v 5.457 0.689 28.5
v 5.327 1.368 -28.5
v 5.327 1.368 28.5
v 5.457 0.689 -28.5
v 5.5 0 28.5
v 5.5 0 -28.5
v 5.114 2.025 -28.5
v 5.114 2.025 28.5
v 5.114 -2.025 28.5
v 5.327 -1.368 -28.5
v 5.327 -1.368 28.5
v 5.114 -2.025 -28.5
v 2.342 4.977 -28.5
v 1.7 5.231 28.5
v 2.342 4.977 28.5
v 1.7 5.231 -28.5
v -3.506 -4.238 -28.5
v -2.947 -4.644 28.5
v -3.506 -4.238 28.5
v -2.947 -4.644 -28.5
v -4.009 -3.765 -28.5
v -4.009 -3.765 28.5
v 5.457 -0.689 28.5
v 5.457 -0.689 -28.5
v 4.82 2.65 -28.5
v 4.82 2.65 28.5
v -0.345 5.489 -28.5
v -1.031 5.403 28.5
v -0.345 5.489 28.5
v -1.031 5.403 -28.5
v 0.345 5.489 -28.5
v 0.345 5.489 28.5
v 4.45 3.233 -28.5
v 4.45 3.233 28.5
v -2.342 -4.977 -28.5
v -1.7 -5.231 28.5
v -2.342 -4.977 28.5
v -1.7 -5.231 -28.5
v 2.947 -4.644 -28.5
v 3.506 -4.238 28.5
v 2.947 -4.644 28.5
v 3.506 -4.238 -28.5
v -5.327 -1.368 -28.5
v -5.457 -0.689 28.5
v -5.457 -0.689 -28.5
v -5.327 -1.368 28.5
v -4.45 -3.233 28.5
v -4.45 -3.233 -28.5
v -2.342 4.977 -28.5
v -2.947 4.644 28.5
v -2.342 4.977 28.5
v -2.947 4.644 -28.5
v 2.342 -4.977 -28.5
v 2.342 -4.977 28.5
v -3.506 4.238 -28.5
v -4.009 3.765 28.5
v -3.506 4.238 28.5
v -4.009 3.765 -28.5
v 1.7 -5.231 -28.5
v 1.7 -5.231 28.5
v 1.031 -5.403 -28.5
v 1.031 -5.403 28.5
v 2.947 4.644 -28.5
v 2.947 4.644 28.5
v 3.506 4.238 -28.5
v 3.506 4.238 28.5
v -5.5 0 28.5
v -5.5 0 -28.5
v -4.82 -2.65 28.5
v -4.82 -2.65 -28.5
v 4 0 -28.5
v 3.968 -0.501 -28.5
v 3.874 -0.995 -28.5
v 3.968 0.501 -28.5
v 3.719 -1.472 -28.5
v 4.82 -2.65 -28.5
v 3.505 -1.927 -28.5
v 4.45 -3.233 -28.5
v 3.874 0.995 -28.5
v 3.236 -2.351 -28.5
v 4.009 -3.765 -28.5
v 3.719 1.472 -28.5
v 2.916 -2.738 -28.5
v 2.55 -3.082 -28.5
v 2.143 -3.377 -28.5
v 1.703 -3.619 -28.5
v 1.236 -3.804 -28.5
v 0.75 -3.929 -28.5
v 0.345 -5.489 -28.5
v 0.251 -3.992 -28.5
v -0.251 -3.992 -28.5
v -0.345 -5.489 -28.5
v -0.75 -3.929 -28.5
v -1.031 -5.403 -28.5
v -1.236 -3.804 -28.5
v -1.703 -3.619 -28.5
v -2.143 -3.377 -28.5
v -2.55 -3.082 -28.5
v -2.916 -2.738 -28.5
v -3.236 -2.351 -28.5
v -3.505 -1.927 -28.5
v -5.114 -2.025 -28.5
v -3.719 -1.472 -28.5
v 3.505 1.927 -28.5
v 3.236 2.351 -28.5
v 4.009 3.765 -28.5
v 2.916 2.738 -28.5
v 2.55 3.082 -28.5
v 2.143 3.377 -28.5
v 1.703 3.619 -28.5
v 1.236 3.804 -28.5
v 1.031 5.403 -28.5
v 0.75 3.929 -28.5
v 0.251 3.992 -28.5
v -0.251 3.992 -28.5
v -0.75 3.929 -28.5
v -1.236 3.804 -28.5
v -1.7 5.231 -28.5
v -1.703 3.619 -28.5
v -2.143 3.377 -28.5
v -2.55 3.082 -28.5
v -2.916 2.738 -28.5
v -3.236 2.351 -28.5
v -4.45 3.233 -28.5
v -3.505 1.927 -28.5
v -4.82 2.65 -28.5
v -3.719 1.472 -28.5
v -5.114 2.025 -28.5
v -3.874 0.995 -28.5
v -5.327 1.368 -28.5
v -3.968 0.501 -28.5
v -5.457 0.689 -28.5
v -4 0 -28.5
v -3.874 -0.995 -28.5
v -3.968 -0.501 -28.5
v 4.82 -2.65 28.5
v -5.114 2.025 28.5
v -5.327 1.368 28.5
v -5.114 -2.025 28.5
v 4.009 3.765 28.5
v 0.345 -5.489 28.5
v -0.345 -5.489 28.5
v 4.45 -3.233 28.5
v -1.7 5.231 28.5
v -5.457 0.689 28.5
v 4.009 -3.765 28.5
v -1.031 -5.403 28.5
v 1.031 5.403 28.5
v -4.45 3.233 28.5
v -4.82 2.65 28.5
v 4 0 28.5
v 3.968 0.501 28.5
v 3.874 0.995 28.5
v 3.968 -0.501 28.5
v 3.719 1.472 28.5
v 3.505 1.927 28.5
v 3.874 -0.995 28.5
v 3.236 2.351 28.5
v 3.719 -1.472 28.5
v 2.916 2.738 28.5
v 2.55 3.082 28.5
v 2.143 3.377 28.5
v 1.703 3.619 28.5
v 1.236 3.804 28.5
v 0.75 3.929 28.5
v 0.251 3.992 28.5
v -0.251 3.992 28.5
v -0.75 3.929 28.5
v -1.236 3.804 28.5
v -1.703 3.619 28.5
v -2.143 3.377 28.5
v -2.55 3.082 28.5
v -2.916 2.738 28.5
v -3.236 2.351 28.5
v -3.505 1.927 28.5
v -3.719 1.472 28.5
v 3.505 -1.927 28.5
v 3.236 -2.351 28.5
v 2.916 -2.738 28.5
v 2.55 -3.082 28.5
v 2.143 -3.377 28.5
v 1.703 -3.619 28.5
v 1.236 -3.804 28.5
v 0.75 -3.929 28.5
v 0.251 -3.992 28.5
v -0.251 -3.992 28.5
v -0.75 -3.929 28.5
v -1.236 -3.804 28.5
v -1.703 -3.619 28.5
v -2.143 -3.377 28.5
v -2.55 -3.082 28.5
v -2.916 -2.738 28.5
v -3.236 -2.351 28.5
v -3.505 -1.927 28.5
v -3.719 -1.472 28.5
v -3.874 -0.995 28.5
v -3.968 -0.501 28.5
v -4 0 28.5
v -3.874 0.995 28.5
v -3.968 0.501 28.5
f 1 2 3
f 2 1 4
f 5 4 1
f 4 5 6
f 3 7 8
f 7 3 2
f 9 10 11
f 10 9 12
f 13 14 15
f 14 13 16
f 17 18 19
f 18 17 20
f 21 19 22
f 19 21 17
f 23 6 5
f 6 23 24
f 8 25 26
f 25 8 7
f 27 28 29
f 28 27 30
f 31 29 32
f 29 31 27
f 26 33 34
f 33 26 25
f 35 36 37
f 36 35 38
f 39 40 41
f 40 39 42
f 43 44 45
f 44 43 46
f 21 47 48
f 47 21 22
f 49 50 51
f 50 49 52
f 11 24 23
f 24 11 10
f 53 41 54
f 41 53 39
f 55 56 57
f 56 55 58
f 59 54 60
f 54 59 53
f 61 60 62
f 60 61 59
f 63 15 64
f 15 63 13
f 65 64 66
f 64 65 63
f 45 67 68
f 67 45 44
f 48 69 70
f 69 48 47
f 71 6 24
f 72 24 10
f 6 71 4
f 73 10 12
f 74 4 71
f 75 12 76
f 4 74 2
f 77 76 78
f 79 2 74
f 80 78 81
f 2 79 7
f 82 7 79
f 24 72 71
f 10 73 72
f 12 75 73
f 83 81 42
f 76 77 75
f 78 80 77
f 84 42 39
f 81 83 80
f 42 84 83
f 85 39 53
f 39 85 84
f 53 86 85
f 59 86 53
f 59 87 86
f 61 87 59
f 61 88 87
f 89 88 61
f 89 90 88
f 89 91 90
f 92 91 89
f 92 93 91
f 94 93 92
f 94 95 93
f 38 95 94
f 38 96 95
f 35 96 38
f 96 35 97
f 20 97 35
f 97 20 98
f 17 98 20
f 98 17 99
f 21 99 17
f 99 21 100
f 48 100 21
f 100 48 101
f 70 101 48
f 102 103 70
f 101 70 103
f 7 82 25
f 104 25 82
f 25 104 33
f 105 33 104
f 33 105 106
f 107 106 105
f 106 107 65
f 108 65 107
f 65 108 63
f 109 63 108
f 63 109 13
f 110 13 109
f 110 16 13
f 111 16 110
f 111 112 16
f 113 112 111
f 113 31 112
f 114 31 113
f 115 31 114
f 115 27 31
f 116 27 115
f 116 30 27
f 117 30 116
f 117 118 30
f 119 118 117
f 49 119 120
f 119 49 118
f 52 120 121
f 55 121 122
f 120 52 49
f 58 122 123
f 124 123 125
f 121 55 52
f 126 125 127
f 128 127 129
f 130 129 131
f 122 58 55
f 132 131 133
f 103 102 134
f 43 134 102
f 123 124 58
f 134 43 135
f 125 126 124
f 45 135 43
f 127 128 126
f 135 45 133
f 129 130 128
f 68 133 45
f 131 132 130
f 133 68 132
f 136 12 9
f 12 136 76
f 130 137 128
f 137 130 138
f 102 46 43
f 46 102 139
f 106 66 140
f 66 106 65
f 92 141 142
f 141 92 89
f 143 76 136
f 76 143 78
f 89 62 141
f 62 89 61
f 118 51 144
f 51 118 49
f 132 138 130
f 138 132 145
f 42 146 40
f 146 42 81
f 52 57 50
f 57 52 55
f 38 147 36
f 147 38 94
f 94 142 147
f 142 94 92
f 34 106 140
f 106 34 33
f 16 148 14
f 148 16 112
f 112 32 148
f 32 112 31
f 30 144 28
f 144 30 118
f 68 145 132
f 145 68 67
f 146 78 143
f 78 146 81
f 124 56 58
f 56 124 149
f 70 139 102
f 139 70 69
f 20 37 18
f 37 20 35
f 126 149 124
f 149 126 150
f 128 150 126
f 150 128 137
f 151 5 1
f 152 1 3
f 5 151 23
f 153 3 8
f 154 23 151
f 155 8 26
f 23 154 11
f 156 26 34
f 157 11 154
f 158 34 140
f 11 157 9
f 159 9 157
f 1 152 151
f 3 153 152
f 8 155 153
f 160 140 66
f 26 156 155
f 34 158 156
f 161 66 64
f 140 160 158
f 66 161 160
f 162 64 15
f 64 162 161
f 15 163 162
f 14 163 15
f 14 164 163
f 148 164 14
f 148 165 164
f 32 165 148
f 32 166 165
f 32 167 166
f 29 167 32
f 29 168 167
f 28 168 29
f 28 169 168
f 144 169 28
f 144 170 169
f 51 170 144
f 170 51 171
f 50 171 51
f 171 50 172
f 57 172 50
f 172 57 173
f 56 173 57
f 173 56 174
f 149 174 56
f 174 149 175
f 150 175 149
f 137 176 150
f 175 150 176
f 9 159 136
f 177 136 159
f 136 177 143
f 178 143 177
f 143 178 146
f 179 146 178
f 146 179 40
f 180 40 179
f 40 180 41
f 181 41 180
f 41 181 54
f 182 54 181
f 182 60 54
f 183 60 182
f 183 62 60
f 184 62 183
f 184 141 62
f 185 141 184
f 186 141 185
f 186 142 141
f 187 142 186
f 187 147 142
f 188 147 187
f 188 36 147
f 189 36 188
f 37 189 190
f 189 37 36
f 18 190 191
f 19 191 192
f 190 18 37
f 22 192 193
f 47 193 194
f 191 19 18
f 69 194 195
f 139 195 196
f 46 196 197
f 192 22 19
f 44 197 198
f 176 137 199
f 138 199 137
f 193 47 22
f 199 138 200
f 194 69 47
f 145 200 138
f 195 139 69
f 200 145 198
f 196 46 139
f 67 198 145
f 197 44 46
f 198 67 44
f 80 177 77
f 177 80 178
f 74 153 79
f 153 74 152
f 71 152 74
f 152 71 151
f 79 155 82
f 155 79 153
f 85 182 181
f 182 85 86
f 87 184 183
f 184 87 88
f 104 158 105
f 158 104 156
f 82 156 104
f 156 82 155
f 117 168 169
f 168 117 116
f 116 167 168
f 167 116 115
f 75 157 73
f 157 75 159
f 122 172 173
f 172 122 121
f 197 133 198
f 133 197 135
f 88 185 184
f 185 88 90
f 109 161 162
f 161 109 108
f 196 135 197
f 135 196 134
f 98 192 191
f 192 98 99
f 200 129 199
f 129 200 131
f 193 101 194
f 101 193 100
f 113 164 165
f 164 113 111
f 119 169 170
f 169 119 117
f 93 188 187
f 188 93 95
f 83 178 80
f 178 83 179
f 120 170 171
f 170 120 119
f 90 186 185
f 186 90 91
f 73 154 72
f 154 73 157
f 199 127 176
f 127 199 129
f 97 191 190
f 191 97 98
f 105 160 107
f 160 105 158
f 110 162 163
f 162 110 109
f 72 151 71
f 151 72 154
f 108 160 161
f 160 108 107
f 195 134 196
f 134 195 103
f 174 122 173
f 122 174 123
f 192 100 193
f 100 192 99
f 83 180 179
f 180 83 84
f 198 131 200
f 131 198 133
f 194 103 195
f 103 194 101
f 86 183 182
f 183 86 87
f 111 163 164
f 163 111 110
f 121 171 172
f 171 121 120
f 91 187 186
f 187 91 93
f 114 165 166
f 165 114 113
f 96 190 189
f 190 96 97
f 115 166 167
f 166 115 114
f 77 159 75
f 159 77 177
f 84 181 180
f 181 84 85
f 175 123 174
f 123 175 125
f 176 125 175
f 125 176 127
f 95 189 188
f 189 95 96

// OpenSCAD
$fn = 50;


difference() {
	union() {
		translate(v = [0, 0, -28.5000000000]) {
			cylinder(h = 57, r = 5.5000000000);
		}
	}
	union() {
		translate(v = [0, 0, -100.0000000000]) {
			cylinder(h = 200, r = 4.0000000000);
		}
	}
}
